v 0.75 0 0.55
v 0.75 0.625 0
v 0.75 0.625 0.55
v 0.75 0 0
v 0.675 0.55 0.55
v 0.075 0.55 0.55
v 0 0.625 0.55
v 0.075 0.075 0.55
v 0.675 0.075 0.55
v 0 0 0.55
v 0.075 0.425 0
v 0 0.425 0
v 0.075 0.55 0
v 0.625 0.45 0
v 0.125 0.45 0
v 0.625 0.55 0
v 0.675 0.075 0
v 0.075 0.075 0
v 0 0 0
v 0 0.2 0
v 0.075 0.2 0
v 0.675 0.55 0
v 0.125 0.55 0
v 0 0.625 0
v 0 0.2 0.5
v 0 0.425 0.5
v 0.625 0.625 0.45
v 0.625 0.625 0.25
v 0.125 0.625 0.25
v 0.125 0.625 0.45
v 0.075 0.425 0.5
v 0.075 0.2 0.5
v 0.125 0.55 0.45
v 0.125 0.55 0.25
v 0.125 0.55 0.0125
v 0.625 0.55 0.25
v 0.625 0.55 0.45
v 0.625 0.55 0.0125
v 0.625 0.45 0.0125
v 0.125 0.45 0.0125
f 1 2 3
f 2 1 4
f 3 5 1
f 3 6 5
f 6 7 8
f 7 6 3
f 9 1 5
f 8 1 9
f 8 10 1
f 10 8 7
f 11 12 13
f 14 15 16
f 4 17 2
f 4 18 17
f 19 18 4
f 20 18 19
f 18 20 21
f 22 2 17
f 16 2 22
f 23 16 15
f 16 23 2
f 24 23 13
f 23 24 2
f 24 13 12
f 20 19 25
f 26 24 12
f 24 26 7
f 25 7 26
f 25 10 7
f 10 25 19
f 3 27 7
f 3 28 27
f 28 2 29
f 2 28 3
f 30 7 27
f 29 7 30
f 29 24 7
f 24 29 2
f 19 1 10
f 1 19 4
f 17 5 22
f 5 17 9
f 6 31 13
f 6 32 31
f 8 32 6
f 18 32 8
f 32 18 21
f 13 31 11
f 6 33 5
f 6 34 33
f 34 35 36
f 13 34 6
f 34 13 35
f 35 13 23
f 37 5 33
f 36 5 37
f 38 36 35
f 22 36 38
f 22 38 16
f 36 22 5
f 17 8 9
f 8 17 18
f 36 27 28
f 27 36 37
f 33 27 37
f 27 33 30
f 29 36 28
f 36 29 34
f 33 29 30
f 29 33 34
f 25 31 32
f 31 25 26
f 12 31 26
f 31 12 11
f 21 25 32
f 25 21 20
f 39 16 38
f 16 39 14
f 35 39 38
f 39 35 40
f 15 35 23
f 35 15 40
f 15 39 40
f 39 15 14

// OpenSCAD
// ==============================================
// Parameters (all dimensions in inches)
// ==============================================
outer_x = 0.75;    // Outer width (left-right axis)
outer_y = 0.625;   // Outer depth (front-back axis, front at Y=outer_y)
outer_z = 0.55;    // Outer height (base at Z=0, top at Z=0.55)
wall_thickness = 0.075; // Uniform wall thickness

// Front cutout parameters
front_cut_width = 0.5;
front_cut_side_margin = 0.125;
front_cut_z_low = 0.25;
front_cut_z_high = 0.45;

// Left side cutout parameters
left_cut_front_margin = 0.2;
left_cut_back_margin = 0.2;
left_cut_z_max = 0.5;

// Internal ledge parameters
ledge_width = 0.5;
ledge_side_margin = 0.125;
ledge_depth = 0.1;
ledge_thickness = 0.0125;

// Resolution setting for curved surfaces
$fn = 100;

// ==============================================
// Module Definitions
// ==============================================
module hollow_open_top_enclosure(ox, oy, oz, wall_t) {
    // Generates hollow rectangular enclosure with open top, straight vertical walls
    difference() {
        // Outer solid block
        cube([ox, oy, oz]);
        // Inner void, extended slightly above top to ensure full cut through
        translate([wall_t, wall_t, 0])
        cube([ox - 2*wall_t, oy - 2*wall_t, oz + 0.1]);
    }
}

// ==============================================
// Main Model Assembly
// ==============================================
union() {
    // Base enclosure with cutouts
    difference() {
        hollow_open_top_enclosure(outer_x, outer_y, outer_z, wall_thickness);
        
        // Front horizontal wall cut
        translate([
            front_cut_side_margin,
            outer_y - wall_thickness,
            front_cut_z_low
        ])
        cube([
            front_cut_width,
            wall_thickness,
            front_cut_z_high - front_cut_z_low
        ]);
        
        // Left side vertical opening
        translate([
            0,
            left_cut_back_margin,
            0
        ])
        cube([
            wall_thickness,
            outer_y - left_cut_front_margin - left_cut_back_margin,
            left_cut_z_max
        ]);
    }
    
    // Internal front ledge
    translate([
        ledge_side_margin,
        outer_y - wall_thickness - ledge_depth,
        0
    ])
    cube([ledge_width, ledge_depth, ledge_thickness]);
}
